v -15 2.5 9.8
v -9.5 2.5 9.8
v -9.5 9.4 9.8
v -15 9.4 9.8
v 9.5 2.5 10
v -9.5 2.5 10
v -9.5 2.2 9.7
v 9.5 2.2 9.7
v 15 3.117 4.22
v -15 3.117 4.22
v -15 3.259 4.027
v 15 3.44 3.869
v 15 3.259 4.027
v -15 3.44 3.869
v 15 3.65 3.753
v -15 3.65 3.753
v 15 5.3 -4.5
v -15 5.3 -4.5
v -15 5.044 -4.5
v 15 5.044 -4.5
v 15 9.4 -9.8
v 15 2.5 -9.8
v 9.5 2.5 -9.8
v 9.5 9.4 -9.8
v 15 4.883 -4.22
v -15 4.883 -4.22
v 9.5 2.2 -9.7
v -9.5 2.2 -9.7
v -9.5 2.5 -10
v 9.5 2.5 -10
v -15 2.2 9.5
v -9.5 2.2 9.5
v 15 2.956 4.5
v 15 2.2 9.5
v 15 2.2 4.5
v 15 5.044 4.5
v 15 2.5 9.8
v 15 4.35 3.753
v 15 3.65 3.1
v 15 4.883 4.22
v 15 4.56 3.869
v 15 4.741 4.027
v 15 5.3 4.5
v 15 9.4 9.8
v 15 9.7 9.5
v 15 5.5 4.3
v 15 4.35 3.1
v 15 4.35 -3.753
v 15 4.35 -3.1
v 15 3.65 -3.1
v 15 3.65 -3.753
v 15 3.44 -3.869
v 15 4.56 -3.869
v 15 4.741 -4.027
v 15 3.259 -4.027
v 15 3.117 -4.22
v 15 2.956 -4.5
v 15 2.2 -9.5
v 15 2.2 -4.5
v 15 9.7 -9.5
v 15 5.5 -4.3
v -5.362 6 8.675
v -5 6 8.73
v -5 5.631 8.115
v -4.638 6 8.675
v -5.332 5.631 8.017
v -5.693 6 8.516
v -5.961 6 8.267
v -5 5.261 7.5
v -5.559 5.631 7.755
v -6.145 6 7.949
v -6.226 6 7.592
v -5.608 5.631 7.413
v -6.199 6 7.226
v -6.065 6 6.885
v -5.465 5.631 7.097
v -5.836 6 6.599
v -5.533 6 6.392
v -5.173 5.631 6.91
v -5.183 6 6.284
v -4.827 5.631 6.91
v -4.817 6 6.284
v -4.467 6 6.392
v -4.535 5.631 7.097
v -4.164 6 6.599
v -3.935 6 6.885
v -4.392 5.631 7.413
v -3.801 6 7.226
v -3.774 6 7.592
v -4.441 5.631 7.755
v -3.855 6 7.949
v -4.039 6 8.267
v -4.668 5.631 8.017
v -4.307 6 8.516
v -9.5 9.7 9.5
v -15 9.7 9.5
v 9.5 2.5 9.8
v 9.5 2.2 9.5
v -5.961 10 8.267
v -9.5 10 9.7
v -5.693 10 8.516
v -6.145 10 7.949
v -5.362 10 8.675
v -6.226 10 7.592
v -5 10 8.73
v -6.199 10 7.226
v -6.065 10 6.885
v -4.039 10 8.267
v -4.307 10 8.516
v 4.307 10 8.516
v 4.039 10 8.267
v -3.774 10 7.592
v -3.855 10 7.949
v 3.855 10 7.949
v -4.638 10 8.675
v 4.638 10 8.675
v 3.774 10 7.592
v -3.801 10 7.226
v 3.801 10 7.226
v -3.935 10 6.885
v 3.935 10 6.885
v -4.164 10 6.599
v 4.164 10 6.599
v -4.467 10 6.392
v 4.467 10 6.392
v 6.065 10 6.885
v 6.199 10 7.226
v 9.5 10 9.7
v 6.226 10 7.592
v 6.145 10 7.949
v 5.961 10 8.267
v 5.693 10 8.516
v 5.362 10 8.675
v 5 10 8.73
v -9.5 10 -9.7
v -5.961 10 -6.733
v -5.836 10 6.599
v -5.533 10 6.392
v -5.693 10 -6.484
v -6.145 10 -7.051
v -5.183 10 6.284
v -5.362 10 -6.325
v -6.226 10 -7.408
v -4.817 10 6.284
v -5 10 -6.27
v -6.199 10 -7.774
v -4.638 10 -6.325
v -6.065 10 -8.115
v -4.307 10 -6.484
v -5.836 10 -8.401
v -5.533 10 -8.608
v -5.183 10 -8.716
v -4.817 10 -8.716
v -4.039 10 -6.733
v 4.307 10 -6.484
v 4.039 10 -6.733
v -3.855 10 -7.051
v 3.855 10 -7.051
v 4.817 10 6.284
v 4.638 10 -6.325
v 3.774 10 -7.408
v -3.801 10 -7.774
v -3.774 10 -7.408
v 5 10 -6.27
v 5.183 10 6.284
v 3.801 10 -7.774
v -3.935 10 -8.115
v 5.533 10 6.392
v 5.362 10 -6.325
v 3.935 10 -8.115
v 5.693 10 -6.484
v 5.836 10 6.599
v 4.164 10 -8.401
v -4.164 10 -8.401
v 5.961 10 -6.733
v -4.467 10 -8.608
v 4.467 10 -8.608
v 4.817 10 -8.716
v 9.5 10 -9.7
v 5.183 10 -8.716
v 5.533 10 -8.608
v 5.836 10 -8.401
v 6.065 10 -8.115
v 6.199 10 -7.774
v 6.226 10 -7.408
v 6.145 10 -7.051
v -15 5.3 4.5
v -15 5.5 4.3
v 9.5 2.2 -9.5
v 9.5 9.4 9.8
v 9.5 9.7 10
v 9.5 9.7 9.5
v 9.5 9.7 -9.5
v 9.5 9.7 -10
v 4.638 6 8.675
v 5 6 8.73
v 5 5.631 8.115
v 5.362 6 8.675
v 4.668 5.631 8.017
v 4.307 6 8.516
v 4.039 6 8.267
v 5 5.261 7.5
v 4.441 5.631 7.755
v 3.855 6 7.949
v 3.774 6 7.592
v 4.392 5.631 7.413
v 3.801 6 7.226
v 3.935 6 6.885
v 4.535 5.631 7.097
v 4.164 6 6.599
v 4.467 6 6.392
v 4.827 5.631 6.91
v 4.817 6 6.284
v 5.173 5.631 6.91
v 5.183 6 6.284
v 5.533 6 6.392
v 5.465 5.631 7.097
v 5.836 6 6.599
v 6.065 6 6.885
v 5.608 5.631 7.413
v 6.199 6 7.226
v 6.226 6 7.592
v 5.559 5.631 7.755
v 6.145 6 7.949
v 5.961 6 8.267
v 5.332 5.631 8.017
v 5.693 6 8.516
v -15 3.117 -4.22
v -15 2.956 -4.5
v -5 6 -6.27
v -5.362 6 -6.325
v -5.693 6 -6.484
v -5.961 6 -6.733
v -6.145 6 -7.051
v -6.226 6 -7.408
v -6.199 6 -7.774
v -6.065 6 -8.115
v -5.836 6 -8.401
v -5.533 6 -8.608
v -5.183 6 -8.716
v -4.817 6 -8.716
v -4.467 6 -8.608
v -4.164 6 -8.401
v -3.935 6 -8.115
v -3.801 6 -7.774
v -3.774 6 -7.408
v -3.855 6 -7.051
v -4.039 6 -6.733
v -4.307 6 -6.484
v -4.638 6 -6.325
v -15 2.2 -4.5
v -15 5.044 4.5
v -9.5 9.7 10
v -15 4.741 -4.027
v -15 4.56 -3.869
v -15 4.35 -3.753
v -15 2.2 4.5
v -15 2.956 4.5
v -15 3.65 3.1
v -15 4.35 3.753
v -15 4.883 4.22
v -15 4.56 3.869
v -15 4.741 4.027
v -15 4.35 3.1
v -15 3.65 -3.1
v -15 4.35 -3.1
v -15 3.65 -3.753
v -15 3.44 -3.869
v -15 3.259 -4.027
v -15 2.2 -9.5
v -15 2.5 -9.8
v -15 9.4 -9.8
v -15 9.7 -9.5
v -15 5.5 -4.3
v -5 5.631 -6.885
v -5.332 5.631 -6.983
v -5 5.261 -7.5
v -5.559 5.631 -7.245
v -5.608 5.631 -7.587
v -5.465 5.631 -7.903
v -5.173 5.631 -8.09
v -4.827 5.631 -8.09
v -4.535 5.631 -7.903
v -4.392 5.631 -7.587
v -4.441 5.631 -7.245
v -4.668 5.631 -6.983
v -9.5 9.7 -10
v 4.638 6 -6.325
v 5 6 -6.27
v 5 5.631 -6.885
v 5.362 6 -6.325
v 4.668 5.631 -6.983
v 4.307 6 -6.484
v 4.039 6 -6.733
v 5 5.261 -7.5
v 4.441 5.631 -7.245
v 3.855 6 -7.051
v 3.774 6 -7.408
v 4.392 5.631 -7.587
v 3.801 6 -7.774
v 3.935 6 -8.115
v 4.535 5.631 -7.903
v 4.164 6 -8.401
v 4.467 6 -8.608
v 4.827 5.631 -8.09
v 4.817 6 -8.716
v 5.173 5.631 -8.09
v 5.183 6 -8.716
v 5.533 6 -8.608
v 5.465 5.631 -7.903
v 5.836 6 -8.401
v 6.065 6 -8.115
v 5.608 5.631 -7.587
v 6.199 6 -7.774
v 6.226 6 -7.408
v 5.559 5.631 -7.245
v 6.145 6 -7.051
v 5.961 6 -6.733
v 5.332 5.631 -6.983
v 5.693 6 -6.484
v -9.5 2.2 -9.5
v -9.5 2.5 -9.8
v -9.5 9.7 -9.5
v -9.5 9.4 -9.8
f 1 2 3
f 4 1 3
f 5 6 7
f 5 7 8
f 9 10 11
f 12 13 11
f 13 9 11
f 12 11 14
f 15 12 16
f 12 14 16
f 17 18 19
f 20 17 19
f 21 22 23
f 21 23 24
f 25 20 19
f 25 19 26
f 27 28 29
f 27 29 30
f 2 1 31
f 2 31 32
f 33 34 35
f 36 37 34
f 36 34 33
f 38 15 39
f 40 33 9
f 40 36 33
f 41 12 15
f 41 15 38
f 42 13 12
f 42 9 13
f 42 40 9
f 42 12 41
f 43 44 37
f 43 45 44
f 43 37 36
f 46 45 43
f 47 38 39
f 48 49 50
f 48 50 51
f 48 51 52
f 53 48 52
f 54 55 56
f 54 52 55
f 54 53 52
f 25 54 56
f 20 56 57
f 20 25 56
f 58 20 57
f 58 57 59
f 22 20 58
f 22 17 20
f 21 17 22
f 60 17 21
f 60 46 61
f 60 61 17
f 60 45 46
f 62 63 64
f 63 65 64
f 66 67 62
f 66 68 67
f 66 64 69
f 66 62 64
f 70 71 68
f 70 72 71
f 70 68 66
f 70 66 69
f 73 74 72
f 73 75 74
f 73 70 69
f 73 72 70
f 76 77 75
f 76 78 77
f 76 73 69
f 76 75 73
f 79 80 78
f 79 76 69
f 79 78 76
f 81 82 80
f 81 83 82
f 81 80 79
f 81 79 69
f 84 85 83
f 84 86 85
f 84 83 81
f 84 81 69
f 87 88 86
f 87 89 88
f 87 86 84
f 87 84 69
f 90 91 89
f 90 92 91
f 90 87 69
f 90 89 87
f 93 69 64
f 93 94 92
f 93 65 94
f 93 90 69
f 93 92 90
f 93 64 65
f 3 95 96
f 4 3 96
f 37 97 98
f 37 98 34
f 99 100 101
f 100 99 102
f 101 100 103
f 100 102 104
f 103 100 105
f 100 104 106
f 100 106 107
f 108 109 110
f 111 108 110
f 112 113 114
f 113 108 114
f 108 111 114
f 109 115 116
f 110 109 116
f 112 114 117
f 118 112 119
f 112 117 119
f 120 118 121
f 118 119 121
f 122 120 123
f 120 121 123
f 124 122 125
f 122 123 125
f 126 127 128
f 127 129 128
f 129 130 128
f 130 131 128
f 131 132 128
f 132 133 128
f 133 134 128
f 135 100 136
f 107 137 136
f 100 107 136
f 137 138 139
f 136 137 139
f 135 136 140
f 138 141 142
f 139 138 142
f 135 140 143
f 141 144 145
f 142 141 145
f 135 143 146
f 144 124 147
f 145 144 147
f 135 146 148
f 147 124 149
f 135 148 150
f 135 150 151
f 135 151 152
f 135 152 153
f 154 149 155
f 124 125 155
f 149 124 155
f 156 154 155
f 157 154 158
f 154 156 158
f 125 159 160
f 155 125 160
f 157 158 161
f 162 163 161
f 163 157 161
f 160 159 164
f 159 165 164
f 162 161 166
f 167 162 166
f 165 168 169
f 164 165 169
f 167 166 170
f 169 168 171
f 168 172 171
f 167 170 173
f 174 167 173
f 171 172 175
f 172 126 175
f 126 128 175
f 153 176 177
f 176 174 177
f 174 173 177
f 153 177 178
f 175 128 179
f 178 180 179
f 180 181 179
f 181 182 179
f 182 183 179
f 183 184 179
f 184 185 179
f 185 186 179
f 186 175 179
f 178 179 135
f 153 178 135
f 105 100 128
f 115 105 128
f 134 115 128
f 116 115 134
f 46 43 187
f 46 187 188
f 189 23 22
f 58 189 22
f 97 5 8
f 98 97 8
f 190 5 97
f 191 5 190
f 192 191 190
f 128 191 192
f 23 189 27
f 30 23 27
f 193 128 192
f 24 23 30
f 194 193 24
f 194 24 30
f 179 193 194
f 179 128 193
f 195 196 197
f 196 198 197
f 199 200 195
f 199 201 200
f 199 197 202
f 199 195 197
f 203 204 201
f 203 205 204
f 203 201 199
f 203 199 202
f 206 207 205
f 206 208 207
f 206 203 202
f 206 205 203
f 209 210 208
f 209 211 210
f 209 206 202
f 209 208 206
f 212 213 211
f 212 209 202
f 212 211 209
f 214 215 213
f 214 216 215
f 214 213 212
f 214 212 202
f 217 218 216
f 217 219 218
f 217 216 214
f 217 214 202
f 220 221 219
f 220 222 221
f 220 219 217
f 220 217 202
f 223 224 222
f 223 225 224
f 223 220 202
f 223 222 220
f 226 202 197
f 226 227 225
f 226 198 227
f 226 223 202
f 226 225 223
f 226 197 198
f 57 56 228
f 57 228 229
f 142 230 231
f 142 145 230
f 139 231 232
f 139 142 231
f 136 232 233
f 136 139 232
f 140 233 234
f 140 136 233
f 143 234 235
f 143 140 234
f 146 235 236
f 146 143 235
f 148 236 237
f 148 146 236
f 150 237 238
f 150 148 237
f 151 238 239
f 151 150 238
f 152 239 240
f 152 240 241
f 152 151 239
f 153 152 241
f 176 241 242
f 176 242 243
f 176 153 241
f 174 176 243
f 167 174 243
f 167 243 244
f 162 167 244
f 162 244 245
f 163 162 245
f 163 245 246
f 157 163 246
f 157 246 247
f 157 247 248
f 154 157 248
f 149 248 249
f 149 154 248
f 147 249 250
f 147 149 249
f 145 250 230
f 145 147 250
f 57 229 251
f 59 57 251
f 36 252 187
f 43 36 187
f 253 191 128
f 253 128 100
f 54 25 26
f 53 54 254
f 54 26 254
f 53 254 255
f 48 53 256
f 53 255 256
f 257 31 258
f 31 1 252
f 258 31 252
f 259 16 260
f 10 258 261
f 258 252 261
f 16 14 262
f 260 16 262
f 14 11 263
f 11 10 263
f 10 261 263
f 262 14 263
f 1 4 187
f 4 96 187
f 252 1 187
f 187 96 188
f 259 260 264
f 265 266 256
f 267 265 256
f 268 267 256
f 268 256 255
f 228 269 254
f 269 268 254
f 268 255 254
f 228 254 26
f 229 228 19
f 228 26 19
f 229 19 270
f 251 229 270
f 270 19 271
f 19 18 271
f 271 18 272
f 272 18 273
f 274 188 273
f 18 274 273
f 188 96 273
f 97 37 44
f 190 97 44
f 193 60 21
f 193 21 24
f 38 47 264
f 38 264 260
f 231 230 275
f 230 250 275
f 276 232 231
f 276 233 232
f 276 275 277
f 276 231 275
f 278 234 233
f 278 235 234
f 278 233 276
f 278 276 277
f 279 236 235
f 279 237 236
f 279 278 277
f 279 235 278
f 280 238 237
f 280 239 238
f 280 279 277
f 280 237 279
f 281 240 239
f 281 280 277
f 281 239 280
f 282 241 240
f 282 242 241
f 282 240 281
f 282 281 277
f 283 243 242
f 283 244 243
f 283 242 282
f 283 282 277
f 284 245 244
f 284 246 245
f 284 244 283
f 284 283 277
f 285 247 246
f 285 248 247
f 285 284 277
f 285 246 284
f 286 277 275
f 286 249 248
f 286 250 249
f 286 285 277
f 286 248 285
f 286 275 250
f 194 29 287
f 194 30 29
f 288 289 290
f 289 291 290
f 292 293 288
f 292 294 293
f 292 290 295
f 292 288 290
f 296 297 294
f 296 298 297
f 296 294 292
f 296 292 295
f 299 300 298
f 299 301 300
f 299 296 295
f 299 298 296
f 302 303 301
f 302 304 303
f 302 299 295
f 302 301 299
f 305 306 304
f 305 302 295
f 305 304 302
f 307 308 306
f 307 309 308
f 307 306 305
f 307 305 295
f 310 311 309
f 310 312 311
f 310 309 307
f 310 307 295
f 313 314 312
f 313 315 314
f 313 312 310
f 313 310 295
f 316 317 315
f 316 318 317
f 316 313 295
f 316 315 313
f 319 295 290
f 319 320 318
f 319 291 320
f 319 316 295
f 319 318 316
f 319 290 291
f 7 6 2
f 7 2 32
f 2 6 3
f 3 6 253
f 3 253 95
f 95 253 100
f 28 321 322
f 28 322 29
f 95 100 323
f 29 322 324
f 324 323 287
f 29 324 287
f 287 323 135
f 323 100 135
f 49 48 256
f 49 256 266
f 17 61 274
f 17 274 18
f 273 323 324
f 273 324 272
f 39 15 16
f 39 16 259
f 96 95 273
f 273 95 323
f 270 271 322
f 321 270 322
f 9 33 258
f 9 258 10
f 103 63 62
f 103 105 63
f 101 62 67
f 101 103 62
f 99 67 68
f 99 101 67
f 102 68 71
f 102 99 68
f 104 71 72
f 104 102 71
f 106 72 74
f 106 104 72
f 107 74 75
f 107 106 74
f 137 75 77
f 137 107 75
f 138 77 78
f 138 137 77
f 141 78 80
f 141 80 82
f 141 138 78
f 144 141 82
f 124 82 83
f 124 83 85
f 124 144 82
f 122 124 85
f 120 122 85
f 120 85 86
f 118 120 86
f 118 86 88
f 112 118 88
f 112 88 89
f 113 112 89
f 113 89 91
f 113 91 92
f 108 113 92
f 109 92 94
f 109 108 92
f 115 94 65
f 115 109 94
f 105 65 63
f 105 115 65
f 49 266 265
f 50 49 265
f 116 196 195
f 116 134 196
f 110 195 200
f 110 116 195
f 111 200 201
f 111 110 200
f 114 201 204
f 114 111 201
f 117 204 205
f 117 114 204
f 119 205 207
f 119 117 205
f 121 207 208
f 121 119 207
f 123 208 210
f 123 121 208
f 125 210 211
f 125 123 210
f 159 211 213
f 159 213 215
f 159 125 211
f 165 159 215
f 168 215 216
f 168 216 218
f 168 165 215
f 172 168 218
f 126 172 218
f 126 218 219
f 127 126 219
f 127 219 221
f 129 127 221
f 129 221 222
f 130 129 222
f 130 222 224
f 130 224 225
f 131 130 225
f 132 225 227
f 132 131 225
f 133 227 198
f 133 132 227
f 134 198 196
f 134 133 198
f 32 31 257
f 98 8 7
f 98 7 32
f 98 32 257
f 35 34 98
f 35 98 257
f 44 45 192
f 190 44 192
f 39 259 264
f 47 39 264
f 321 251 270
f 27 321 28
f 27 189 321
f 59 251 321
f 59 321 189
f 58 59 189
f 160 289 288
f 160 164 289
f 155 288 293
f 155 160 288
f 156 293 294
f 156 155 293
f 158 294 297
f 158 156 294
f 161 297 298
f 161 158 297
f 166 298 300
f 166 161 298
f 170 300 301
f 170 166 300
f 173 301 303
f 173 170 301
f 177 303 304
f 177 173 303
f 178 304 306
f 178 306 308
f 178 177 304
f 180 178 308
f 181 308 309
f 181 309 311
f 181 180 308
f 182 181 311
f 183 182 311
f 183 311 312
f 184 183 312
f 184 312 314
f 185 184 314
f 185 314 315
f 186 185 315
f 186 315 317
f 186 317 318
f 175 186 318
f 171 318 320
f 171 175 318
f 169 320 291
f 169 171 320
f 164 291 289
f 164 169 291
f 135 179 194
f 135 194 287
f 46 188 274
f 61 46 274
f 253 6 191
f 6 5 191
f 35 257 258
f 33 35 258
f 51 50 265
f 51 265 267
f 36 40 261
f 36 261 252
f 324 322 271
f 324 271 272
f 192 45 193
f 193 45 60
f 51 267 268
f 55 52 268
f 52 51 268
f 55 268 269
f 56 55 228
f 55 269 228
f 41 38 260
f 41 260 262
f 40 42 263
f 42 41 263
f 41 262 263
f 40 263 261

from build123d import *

# Parameters (mm, degrees)
SKETCH1_W               = 19.6
SKETCH1_H               = 7.5
BOSS_EXTRUDE1_DEPTH     = 15
SKETCH2_W               = 20
SKETCH2_H               = 7.8
BOSS_EXTRUDE2_DEPTH     = 9.5
CUT_EXTRUDE2_DEPTH      = 21.615528128
CUT_EXTRUDE2_DEPTH_BACK = 21.615528128
CHAMFER1_SIZE           = 0.3
CHAMFER2_SIZE           = 0.3
CHAMFER3_SIZE           = 0.3
CHAMFER4_SIZE           = 0.3
LPATTERN2_COUNT         = 2
LPATTERN2_PITCH         = 10
LPATTERN2_COUNT_DIR2    = 2
LPATTERN2_PITCH_DIR2    = 15


with BuildPart() as part:
    # Sketch1 → Boss-Extrude1 (new, symmetric)
    with BuildSketch(Plane(origin=(0, 0, 0), x_dir=(0, 0, -1), z_dir=(1, 0, 0))):
        with Locations((0, 5.95)):
            Rectangle(SKETCH1_W, SKETCH1_H)
    extrude(amount=BOSS_EXTRUDE1_DEPTH, both=True)

    # Sketch2 → Boss-Extrude2 (add, symmetric)
    with BuildSketch(Plane(origin=(0, 0, 0), x_dir=(0, 0, -1), z_dir=(1, 0, 0))):
        with Locations((0, 6.1)):
            Rectangle(SKETCH2_W, SKETCH2_H)
    extrude(amount=BOSS_EXTRUDE2_DEPTH, both=True)

    # Sketch4 → Cut-Extrude2 (cut, two sides: drawn at the far end of the back side and taken through both)
    with BuildSketch(Plane(origin=(0, 0, 0), x_dir=(0, 0, -1), z_dir=(1, 0, 0)).offset(-CUT_EXTRUDE2_DEPTH_BACK)):
        with BuildLine():
            Line((-4.3, 5.5), (4.3, 5.5))
            Line((4.3, 5.5), (4.5, 5.3))
            Line((4.5, 5.3), (4.5, 5.04428602))
            Line((4.5, 5.04428602), (4.22, 4.882627944))
            ThreePointArc((4.22, 4.882627944), (3.942636741, 4.654893122), (3.753338798, 4.35))
            Line((3.753338798, 4.35), (3.1, 4.35))
            Line((3.1, 4.35), (3.1, 3.65))
            Line((3.1, 3.65), (3.753338798, 3.65))
            ThreePointArc((3.753338798, 3.65), (3.942636741, 3.345106878), (4.22, 3.117372056))
            Line((4.22, 3.117372056), (4.5, 2.95571398))
            Line((4.5, 2.95571398), (4.5, 0))
            Line((4.5, 0), (-4.5, 0))
            Line((-4.5, 0), (-4.5, 2.95571398))
            Line((-4.5, 2.95571398), (-4.22, 3.117372056))
            ThreePointArc((-4.22, 3.117372056), (-3.942636741, 3.345106878), (-3.753338798, 3.65))
            Line((-3.753338798, 3.65), (-3.1, 3.65))
            Line((-3.1, 3.65), (-3.1, 4.35))
            Line((-3.1, 4.35), (-3.753338798, 4.35))
            ThreePointArc((-3.753338798, 4.35), (-3.942636741, 4.654893122), (-4.22, 4.882627944))
            Line((-4.22, 4.882627944), (-4.5, 5.04428602))
            Line((-4.5, 5.04428602), (-4.5, 5.3))
            Line((-4.5, 5.3), (-4.3, 5.5))
        make_face()
    extrude(amount=CUT_EXTRUDE2_DEPTH + CUT_EXTRUDE2_DEPTH_BACK, mode=Mode.SUBTRACT)

    # Chamfer1
    chamfer1_edges = [part.edges().sort_by_distance(p)[0] for p in [
        (-12.25, 9.7, 9.8),
        (-12.25, 9.7, -9.8),
        (12.25, 9.7, 9.8),
        (12.25, 9.7, -9.8),
    ]]
    chamfer(chamfer1_edges, length=CHAMFER1_SIZE)

    # Chamfer2
    chamfer2_edges = [part.edges().sort_by_distance(p)[0] for p in [
        (0, 10, 10),
        (0, 10, -10),
    ]]
    chamfer(chamfer2_edges, length=CHAMFER2_SIZE)

    # Chamfer3
    chamfer3_edges = [part.edges().sort_by_distance(p)[0] for p in [
        (-12.25, 2.2, -9.8),
        (-12.25, 2.2, 9.8),
        (12.25, 2.2, -9.8),
        (12.25, 2.2, 9.8),
    ]]
    chamfer(chamfer3_edges, length=CHAMFER3_SIZE)

    # Chamfer4
    chamfer4_edges = [part.edges().sort_by_distance(p)[0] for p in [
        (0, 2.2, 10),
        (0, 2.2, -10),
    ]]
    chamfer(chamfer4_edges, length=CHAMFER4_SIZE)

    # Sketch7 → Tap2 (revolve, cut)
    with BuildSketch(Plane(origin=(-5, 10, -7.5), x_dir=(0, 0, 1), z_dir=(1, 0, 0))):
        Polygon((0, 0), (0, 4.738758131), (1.2295, 4), (1.2295, 0), align=None)
    tap2 = revolve(axis=Axis((-5, 10, -7.5), (0, -1, 0)), mode=Mode.SUBTRACT)

    # LPattern2: Tap2 2 × 2
    with Locations(*[(i * LPATTERN2_PITCH, 0, j * LPATTERN2_PITCH_DIR2) for i in range(LPATTERN2_COUNT) for j in range(LPATTERN2_COUNT_DIR2) if (i, j) != (0, 0)]):
        add(tap2, mode=Mode.SUBTRACT)


solid = part.part
